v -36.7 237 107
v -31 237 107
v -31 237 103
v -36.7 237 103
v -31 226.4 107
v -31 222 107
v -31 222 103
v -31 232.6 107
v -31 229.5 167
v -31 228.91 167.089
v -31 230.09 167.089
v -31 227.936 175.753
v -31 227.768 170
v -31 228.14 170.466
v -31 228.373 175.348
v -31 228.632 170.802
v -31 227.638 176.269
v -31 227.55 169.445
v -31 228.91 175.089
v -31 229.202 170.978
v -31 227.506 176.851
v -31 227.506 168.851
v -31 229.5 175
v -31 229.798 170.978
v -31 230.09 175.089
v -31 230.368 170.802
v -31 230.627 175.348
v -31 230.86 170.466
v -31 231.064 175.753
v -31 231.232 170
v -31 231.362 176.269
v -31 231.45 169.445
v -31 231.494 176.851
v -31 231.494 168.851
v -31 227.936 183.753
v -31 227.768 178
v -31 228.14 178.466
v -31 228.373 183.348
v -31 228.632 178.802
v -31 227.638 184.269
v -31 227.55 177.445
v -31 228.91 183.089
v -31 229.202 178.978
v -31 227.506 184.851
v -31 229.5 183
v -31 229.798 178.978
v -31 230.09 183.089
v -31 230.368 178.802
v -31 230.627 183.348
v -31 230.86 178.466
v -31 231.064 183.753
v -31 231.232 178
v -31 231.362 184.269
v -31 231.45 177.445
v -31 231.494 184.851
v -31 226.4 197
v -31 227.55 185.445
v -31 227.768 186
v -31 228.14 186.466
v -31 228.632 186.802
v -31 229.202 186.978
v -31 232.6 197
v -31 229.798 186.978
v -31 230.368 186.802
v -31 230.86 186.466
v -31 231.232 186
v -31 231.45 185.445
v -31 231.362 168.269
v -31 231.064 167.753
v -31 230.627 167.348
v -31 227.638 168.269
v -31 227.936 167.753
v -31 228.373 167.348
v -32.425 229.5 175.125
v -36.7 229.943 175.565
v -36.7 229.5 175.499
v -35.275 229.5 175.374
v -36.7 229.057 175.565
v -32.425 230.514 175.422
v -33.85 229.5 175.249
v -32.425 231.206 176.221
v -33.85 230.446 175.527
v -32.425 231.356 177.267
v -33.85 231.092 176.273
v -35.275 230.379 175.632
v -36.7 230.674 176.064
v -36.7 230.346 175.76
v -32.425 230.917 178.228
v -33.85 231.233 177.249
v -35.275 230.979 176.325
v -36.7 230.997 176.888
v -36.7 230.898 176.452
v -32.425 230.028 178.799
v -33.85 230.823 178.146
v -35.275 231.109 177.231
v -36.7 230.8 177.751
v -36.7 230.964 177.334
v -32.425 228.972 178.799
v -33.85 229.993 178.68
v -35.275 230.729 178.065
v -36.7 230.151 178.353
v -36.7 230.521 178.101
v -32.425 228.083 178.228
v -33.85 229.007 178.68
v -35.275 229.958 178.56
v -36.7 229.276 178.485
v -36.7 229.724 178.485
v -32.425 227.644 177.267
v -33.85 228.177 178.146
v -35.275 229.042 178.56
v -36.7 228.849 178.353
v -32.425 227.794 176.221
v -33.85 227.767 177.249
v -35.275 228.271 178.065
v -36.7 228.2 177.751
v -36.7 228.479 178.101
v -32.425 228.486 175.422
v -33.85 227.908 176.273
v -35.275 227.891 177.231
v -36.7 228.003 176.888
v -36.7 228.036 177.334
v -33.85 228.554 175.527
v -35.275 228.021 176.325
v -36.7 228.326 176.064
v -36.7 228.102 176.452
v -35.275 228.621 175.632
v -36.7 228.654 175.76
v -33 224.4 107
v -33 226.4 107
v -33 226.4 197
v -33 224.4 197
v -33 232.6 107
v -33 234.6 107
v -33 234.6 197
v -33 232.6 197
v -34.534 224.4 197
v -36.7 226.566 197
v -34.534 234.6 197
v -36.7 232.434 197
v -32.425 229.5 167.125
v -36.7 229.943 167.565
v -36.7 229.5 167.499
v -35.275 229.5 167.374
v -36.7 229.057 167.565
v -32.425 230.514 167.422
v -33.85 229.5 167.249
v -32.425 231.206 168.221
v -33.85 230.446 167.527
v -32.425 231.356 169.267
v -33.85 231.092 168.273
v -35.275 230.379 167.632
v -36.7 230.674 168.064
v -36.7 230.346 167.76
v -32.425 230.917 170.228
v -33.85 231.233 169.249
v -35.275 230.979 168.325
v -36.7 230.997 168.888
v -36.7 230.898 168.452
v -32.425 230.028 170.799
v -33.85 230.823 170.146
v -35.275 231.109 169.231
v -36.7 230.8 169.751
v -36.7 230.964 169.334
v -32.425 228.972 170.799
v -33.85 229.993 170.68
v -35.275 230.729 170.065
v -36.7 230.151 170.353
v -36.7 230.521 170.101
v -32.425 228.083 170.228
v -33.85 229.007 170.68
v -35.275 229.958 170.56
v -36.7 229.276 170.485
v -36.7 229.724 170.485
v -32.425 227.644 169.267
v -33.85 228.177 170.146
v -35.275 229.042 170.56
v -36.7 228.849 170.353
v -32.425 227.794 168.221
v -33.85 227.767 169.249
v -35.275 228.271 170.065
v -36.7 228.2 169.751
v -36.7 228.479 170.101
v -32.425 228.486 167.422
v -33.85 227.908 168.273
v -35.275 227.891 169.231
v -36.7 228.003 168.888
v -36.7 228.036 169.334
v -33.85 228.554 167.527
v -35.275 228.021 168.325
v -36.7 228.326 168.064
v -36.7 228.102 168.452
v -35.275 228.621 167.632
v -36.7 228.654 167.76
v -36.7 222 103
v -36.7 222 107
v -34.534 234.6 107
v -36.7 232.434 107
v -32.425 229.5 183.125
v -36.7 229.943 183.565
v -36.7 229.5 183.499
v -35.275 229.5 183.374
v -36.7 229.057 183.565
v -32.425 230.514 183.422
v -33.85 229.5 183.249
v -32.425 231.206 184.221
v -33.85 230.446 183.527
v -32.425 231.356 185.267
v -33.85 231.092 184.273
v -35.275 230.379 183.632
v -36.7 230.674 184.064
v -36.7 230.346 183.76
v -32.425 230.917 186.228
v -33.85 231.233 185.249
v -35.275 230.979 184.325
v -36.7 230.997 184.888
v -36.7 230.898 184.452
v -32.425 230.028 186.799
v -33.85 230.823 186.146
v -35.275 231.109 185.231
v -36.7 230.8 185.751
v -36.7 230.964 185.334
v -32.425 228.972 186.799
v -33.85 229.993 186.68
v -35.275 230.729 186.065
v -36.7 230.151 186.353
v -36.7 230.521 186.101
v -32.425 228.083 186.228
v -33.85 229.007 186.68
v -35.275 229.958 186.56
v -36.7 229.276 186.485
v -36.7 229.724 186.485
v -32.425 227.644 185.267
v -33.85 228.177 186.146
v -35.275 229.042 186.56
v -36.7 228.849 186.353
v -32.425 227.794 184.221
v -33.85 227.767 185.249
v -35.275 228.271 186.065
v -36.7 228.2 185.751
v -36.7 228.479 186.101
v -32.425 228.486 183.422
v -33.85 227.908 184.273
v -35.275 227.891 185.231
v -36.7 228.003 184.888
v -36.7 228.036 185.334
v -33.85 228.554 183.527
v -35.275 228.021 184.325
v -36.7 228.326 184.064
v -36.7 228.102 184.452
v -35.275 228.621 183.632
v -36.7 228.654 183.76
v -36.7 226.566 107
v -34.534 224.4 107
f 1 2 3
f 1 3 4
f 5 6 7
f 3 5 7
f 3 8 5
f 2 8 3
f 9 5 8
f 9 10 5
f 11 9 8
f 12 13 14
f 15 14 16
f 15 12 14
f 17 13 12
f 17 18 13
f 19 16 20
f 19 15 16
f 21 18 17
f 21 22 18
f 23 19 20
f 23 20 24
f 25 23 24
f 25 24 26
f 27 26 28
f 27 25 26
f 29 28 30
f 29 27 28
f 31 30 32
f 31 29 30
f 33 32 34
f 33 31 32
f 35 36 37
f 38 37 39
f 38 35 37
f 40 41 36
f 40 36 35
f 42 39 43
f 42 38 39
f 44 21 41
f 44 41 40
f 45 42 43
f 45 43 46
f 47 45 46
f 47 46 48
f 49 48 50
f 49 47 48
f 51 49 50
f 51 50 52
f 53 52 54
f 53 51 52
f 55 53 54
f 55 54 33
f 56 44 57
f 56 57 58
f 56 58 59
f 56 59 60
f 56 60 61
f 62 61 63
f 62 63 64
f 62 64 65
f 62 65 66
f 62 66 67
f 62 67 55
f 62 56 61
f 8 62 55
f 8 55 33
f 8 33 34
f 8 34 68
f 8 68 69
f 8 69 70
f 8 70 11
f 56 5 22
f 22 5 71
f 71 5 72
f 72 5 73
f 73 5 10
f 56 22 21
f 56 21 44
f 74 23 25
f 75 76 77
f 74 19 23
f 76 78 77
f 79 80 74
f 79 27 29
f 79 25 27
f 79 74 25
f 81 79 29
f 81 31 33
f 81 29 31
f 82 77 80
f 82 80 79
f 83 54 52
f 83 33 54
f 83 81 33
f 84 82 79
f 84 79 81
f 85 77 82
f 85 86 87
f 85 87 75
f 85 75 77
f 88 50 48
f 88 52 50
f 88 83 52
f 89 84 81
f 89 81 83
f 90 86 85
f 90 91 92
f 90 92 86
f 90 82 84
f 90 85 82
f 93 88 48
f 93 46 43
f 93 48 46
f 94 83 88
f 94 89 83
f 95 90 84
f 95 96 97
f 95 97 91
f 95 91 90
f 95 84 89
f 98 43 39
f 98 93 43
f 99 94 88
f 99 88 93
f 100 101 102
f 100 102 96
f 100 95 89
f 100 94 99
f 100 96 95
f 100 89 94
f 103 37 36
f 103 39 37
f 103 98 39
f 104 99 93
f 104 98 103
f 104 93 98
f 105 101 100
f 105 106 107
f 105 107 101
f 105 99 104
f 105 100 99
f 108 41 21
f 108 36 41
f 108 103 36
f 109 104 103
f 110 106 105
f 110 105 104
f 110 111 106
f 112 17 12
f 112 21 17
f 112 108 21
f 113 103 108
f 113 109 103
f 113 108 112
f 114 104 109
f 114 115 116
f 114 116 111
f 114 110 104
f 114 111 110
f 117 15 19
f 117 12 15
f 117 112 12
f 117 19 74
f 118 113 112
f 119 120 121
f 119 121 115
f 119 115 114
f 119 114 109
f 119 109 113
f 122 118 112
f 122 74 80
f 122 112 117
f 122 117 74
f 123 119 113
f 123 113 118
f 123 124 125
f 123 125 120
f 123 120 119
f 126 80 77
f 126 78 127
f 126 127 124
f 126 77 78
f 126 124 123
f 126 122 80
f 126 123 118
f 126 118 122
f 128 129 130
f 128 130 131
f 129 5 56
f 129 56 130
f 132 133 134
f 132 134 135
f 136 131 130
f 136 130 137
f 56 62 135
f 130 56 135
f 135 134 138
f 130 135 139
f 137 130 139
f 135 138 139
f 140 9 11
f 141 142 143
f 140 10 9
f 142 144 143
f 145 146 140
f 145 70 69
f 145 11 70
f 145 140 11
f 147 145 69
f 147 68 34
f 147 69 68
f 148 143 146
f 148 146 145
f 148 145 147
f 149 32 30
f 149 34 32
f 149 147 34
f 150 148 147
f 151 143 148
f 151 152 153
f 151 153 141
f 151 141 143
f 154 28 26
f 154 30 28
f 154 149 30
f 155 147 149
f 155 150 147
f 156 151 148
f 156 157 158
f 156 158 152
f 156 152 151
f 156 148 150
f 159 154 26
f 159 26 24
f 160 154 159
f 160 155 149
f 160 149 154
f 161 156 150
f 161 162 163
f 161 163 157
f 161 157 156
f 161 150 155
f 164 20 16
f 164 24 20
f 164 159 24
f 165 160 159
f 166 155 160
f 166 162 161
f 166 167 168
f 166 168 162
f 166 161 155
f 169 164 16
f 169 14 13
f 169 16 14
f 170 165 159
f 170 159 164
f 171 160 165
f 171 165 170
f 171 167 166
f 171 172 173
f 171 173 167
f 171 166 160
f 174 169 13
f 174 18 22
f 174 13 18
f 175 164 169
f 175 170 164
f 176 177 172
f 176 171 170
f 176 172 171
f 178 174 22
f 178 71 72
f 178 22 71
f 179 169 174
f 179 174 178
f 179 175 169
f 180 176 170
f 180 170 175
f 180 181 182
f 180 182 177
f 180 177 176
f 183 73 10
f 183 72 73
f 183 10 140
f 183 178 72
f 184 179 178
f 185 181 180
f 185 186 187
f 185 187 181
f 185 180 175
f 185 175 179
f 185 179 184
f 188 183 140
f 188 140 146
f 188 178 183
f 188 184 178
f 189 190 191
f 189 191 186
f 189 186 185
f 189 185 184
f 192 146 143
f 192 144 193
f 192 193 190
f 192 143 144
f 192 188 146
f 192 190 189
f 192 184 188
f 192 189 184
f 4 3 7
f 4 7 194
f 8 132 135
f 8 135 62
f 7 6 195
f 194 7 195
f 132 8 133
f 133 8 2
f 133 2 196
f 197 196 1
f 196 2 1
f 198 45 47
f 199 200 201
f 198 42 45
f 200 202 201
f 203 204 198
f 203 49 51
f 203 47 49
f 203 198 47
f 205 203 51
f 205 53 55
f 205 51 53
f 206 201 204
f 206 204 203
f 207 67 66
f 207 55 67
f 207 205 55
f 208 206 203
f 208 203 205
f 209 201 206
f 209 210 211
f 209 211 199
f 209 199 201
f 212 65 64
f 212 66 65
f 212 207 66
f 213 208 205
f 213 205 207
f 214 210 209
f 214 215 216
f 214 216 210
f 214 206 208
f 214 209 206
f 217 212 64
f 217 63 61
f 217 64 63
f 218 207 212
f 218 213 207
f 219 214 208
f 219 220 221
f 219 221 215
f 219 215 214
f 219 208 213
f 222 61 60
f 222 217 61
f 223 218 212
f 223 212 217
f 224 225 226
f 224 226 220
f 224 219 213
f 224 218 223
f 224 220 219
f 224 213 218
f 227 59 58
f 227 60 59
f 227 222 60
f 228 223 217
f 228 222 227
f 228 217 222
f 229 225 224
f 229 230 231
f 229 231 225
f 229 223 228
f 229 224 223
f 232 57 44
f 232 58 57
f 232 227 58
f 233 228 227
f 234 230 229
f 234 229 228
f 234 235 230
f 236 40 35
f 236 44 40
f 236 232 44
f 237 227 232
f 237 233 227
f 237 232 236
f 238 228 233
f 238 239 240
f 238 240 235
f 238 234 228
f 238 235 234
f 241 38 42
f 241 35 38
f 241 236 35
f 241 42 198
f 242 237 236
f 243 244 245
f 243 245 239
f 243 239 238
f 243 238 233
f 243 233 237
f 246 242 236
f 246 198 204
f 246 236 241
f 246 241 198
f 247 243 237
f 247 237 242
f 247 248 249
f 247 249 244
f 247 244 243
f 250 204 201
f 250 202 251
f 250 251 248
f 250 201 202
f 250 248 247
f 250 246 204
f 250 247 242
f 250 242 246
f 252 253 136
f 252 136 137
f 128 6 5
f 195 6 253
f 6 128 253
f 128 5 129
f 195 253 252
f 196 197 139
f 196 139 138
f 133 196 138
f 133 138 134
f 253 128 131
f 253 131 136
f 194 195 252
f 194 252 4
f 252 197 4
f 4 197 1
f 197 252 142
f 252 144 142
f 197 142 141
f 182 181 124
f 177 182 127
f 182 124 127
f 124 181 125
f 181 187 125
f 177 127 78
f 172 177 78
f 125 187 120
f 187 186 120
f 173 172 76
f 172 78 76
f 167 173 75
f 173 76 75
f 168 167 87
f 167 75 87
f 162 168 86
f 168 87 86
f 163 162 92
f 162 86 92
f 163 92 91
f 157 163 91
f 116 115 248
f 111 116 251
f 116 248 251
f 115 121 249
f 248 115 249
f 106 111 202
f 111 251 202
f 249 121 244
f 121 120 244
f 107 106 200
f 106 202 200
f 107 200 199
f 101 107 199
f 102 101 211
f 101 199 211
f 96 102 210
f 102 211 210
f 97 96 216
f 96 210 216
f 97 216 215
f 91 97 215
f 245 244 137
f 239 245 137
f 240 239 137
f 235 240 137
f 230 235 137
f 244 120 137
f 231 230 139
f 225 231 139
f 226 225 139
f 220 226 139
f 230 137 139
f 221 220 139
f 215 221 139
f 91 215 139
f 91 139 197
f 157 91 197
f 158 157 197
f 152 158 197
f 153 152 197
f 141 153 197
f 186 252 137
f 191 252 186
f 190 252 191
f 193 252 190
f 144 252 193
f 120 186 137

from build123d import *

# Parameters (mm, degrees)
PAD118_DEPTH            = 90
POCKET084_DEPTH         = 90.001
SKETCH238_R             = 2
POCKET085_DEPTH         = 10
POCKET085_TAPER         = 5
SKETCH239_W             = 5.7
SKETCH239_H             = 15
PAD119_DEPTH            = 4
BODY139_ROLL_ANGLE      = 90
BODY139_PLACEMENT_ANGLE = 180


with BuildPart() as part:
    # Sketch236 (on Face1 of CopyLinearPattern013) → Pad118 (new body)
    with BuildSketch(Plane(origin=(0, 240, 0), x_dir=(-1, 0, 0), z_dir=(0, 1, 0))):
        Polygon((10, 3.1), (10, -3.1), (8, -3.1), (8, -5.5), (6.3, -5.5), (3.9, -3.1), (3.9, 3.1), (6.3, 5.5), (8, 5.5), (8, 3.1), align=None)
    extrude(amount=PAD118_DEPTH)

    # Sketch237 (on Face11 of Pad118) → Pocket084 (cut, through all)
    with BuildSketch(Plane.XZ.offset(-240)):
        Polygon((-8, 5.1), (-8, 5.5), (-6.3, 5.5), (-3.9, 3.1), (-3.9, -3.1), (-6.3, -5.5), (-8, -5.5), (-8, -5.1), (-6.465685, -5.1), (-4.3, -2.934315), (-4.3, 2.934315), (-6.465685, 5.1), align=None)
    extrude(amount=-POCKET084_DEPTH, mode=Mode.SUBTRACT)

    # Sketch238 (on Face1 of Pocket084) → Pocket085 (cut)
    with BuildSketch(Plane(origin=(-10, 0, 0), x_dir=(0, -1, 0), z_dir=(-1, 0, 0))):
        with Locations((-310, 0)):
            Circle(SKETCH238_R)
        with Locations((-302, 0)):
            Circle(SKETCH238_R)
        with Locations((-318, 0)):
            Circle(SKETCH238_R)
    extrude(amount=-POCKET085_DEPTH, taper=POCKET085_TAPER, mode=Mode.SUBTRACT)

    # Sketch239 (on Face3 of Pocket085) → Pad119 (join)
    with BuildSketch(Plane.XZ.offset(-240)):
        with Locations((-7.15, 0)):
            Rectangle(SKETCH239_W, SKETCH239_H)
    extrude(amount=PAD119_DEPTH)


with BuildPart() as part_1:
    # Body139 roll: moved
    add(part.part.rotate(Axis((0, 0, 0), (1, 0, 0)), BODY139_ROLL_ANGLE))


with BuildPart() as part_2:
    # Body139 placement: moved
    add(part_1.part.moved(Location((-41, 229.5, -133))).rotate(Axis((-41, 229.5, -133), (0, 0, 1)), BODY139_PLACEMENT_ANGLE))


solid = part_2.part
